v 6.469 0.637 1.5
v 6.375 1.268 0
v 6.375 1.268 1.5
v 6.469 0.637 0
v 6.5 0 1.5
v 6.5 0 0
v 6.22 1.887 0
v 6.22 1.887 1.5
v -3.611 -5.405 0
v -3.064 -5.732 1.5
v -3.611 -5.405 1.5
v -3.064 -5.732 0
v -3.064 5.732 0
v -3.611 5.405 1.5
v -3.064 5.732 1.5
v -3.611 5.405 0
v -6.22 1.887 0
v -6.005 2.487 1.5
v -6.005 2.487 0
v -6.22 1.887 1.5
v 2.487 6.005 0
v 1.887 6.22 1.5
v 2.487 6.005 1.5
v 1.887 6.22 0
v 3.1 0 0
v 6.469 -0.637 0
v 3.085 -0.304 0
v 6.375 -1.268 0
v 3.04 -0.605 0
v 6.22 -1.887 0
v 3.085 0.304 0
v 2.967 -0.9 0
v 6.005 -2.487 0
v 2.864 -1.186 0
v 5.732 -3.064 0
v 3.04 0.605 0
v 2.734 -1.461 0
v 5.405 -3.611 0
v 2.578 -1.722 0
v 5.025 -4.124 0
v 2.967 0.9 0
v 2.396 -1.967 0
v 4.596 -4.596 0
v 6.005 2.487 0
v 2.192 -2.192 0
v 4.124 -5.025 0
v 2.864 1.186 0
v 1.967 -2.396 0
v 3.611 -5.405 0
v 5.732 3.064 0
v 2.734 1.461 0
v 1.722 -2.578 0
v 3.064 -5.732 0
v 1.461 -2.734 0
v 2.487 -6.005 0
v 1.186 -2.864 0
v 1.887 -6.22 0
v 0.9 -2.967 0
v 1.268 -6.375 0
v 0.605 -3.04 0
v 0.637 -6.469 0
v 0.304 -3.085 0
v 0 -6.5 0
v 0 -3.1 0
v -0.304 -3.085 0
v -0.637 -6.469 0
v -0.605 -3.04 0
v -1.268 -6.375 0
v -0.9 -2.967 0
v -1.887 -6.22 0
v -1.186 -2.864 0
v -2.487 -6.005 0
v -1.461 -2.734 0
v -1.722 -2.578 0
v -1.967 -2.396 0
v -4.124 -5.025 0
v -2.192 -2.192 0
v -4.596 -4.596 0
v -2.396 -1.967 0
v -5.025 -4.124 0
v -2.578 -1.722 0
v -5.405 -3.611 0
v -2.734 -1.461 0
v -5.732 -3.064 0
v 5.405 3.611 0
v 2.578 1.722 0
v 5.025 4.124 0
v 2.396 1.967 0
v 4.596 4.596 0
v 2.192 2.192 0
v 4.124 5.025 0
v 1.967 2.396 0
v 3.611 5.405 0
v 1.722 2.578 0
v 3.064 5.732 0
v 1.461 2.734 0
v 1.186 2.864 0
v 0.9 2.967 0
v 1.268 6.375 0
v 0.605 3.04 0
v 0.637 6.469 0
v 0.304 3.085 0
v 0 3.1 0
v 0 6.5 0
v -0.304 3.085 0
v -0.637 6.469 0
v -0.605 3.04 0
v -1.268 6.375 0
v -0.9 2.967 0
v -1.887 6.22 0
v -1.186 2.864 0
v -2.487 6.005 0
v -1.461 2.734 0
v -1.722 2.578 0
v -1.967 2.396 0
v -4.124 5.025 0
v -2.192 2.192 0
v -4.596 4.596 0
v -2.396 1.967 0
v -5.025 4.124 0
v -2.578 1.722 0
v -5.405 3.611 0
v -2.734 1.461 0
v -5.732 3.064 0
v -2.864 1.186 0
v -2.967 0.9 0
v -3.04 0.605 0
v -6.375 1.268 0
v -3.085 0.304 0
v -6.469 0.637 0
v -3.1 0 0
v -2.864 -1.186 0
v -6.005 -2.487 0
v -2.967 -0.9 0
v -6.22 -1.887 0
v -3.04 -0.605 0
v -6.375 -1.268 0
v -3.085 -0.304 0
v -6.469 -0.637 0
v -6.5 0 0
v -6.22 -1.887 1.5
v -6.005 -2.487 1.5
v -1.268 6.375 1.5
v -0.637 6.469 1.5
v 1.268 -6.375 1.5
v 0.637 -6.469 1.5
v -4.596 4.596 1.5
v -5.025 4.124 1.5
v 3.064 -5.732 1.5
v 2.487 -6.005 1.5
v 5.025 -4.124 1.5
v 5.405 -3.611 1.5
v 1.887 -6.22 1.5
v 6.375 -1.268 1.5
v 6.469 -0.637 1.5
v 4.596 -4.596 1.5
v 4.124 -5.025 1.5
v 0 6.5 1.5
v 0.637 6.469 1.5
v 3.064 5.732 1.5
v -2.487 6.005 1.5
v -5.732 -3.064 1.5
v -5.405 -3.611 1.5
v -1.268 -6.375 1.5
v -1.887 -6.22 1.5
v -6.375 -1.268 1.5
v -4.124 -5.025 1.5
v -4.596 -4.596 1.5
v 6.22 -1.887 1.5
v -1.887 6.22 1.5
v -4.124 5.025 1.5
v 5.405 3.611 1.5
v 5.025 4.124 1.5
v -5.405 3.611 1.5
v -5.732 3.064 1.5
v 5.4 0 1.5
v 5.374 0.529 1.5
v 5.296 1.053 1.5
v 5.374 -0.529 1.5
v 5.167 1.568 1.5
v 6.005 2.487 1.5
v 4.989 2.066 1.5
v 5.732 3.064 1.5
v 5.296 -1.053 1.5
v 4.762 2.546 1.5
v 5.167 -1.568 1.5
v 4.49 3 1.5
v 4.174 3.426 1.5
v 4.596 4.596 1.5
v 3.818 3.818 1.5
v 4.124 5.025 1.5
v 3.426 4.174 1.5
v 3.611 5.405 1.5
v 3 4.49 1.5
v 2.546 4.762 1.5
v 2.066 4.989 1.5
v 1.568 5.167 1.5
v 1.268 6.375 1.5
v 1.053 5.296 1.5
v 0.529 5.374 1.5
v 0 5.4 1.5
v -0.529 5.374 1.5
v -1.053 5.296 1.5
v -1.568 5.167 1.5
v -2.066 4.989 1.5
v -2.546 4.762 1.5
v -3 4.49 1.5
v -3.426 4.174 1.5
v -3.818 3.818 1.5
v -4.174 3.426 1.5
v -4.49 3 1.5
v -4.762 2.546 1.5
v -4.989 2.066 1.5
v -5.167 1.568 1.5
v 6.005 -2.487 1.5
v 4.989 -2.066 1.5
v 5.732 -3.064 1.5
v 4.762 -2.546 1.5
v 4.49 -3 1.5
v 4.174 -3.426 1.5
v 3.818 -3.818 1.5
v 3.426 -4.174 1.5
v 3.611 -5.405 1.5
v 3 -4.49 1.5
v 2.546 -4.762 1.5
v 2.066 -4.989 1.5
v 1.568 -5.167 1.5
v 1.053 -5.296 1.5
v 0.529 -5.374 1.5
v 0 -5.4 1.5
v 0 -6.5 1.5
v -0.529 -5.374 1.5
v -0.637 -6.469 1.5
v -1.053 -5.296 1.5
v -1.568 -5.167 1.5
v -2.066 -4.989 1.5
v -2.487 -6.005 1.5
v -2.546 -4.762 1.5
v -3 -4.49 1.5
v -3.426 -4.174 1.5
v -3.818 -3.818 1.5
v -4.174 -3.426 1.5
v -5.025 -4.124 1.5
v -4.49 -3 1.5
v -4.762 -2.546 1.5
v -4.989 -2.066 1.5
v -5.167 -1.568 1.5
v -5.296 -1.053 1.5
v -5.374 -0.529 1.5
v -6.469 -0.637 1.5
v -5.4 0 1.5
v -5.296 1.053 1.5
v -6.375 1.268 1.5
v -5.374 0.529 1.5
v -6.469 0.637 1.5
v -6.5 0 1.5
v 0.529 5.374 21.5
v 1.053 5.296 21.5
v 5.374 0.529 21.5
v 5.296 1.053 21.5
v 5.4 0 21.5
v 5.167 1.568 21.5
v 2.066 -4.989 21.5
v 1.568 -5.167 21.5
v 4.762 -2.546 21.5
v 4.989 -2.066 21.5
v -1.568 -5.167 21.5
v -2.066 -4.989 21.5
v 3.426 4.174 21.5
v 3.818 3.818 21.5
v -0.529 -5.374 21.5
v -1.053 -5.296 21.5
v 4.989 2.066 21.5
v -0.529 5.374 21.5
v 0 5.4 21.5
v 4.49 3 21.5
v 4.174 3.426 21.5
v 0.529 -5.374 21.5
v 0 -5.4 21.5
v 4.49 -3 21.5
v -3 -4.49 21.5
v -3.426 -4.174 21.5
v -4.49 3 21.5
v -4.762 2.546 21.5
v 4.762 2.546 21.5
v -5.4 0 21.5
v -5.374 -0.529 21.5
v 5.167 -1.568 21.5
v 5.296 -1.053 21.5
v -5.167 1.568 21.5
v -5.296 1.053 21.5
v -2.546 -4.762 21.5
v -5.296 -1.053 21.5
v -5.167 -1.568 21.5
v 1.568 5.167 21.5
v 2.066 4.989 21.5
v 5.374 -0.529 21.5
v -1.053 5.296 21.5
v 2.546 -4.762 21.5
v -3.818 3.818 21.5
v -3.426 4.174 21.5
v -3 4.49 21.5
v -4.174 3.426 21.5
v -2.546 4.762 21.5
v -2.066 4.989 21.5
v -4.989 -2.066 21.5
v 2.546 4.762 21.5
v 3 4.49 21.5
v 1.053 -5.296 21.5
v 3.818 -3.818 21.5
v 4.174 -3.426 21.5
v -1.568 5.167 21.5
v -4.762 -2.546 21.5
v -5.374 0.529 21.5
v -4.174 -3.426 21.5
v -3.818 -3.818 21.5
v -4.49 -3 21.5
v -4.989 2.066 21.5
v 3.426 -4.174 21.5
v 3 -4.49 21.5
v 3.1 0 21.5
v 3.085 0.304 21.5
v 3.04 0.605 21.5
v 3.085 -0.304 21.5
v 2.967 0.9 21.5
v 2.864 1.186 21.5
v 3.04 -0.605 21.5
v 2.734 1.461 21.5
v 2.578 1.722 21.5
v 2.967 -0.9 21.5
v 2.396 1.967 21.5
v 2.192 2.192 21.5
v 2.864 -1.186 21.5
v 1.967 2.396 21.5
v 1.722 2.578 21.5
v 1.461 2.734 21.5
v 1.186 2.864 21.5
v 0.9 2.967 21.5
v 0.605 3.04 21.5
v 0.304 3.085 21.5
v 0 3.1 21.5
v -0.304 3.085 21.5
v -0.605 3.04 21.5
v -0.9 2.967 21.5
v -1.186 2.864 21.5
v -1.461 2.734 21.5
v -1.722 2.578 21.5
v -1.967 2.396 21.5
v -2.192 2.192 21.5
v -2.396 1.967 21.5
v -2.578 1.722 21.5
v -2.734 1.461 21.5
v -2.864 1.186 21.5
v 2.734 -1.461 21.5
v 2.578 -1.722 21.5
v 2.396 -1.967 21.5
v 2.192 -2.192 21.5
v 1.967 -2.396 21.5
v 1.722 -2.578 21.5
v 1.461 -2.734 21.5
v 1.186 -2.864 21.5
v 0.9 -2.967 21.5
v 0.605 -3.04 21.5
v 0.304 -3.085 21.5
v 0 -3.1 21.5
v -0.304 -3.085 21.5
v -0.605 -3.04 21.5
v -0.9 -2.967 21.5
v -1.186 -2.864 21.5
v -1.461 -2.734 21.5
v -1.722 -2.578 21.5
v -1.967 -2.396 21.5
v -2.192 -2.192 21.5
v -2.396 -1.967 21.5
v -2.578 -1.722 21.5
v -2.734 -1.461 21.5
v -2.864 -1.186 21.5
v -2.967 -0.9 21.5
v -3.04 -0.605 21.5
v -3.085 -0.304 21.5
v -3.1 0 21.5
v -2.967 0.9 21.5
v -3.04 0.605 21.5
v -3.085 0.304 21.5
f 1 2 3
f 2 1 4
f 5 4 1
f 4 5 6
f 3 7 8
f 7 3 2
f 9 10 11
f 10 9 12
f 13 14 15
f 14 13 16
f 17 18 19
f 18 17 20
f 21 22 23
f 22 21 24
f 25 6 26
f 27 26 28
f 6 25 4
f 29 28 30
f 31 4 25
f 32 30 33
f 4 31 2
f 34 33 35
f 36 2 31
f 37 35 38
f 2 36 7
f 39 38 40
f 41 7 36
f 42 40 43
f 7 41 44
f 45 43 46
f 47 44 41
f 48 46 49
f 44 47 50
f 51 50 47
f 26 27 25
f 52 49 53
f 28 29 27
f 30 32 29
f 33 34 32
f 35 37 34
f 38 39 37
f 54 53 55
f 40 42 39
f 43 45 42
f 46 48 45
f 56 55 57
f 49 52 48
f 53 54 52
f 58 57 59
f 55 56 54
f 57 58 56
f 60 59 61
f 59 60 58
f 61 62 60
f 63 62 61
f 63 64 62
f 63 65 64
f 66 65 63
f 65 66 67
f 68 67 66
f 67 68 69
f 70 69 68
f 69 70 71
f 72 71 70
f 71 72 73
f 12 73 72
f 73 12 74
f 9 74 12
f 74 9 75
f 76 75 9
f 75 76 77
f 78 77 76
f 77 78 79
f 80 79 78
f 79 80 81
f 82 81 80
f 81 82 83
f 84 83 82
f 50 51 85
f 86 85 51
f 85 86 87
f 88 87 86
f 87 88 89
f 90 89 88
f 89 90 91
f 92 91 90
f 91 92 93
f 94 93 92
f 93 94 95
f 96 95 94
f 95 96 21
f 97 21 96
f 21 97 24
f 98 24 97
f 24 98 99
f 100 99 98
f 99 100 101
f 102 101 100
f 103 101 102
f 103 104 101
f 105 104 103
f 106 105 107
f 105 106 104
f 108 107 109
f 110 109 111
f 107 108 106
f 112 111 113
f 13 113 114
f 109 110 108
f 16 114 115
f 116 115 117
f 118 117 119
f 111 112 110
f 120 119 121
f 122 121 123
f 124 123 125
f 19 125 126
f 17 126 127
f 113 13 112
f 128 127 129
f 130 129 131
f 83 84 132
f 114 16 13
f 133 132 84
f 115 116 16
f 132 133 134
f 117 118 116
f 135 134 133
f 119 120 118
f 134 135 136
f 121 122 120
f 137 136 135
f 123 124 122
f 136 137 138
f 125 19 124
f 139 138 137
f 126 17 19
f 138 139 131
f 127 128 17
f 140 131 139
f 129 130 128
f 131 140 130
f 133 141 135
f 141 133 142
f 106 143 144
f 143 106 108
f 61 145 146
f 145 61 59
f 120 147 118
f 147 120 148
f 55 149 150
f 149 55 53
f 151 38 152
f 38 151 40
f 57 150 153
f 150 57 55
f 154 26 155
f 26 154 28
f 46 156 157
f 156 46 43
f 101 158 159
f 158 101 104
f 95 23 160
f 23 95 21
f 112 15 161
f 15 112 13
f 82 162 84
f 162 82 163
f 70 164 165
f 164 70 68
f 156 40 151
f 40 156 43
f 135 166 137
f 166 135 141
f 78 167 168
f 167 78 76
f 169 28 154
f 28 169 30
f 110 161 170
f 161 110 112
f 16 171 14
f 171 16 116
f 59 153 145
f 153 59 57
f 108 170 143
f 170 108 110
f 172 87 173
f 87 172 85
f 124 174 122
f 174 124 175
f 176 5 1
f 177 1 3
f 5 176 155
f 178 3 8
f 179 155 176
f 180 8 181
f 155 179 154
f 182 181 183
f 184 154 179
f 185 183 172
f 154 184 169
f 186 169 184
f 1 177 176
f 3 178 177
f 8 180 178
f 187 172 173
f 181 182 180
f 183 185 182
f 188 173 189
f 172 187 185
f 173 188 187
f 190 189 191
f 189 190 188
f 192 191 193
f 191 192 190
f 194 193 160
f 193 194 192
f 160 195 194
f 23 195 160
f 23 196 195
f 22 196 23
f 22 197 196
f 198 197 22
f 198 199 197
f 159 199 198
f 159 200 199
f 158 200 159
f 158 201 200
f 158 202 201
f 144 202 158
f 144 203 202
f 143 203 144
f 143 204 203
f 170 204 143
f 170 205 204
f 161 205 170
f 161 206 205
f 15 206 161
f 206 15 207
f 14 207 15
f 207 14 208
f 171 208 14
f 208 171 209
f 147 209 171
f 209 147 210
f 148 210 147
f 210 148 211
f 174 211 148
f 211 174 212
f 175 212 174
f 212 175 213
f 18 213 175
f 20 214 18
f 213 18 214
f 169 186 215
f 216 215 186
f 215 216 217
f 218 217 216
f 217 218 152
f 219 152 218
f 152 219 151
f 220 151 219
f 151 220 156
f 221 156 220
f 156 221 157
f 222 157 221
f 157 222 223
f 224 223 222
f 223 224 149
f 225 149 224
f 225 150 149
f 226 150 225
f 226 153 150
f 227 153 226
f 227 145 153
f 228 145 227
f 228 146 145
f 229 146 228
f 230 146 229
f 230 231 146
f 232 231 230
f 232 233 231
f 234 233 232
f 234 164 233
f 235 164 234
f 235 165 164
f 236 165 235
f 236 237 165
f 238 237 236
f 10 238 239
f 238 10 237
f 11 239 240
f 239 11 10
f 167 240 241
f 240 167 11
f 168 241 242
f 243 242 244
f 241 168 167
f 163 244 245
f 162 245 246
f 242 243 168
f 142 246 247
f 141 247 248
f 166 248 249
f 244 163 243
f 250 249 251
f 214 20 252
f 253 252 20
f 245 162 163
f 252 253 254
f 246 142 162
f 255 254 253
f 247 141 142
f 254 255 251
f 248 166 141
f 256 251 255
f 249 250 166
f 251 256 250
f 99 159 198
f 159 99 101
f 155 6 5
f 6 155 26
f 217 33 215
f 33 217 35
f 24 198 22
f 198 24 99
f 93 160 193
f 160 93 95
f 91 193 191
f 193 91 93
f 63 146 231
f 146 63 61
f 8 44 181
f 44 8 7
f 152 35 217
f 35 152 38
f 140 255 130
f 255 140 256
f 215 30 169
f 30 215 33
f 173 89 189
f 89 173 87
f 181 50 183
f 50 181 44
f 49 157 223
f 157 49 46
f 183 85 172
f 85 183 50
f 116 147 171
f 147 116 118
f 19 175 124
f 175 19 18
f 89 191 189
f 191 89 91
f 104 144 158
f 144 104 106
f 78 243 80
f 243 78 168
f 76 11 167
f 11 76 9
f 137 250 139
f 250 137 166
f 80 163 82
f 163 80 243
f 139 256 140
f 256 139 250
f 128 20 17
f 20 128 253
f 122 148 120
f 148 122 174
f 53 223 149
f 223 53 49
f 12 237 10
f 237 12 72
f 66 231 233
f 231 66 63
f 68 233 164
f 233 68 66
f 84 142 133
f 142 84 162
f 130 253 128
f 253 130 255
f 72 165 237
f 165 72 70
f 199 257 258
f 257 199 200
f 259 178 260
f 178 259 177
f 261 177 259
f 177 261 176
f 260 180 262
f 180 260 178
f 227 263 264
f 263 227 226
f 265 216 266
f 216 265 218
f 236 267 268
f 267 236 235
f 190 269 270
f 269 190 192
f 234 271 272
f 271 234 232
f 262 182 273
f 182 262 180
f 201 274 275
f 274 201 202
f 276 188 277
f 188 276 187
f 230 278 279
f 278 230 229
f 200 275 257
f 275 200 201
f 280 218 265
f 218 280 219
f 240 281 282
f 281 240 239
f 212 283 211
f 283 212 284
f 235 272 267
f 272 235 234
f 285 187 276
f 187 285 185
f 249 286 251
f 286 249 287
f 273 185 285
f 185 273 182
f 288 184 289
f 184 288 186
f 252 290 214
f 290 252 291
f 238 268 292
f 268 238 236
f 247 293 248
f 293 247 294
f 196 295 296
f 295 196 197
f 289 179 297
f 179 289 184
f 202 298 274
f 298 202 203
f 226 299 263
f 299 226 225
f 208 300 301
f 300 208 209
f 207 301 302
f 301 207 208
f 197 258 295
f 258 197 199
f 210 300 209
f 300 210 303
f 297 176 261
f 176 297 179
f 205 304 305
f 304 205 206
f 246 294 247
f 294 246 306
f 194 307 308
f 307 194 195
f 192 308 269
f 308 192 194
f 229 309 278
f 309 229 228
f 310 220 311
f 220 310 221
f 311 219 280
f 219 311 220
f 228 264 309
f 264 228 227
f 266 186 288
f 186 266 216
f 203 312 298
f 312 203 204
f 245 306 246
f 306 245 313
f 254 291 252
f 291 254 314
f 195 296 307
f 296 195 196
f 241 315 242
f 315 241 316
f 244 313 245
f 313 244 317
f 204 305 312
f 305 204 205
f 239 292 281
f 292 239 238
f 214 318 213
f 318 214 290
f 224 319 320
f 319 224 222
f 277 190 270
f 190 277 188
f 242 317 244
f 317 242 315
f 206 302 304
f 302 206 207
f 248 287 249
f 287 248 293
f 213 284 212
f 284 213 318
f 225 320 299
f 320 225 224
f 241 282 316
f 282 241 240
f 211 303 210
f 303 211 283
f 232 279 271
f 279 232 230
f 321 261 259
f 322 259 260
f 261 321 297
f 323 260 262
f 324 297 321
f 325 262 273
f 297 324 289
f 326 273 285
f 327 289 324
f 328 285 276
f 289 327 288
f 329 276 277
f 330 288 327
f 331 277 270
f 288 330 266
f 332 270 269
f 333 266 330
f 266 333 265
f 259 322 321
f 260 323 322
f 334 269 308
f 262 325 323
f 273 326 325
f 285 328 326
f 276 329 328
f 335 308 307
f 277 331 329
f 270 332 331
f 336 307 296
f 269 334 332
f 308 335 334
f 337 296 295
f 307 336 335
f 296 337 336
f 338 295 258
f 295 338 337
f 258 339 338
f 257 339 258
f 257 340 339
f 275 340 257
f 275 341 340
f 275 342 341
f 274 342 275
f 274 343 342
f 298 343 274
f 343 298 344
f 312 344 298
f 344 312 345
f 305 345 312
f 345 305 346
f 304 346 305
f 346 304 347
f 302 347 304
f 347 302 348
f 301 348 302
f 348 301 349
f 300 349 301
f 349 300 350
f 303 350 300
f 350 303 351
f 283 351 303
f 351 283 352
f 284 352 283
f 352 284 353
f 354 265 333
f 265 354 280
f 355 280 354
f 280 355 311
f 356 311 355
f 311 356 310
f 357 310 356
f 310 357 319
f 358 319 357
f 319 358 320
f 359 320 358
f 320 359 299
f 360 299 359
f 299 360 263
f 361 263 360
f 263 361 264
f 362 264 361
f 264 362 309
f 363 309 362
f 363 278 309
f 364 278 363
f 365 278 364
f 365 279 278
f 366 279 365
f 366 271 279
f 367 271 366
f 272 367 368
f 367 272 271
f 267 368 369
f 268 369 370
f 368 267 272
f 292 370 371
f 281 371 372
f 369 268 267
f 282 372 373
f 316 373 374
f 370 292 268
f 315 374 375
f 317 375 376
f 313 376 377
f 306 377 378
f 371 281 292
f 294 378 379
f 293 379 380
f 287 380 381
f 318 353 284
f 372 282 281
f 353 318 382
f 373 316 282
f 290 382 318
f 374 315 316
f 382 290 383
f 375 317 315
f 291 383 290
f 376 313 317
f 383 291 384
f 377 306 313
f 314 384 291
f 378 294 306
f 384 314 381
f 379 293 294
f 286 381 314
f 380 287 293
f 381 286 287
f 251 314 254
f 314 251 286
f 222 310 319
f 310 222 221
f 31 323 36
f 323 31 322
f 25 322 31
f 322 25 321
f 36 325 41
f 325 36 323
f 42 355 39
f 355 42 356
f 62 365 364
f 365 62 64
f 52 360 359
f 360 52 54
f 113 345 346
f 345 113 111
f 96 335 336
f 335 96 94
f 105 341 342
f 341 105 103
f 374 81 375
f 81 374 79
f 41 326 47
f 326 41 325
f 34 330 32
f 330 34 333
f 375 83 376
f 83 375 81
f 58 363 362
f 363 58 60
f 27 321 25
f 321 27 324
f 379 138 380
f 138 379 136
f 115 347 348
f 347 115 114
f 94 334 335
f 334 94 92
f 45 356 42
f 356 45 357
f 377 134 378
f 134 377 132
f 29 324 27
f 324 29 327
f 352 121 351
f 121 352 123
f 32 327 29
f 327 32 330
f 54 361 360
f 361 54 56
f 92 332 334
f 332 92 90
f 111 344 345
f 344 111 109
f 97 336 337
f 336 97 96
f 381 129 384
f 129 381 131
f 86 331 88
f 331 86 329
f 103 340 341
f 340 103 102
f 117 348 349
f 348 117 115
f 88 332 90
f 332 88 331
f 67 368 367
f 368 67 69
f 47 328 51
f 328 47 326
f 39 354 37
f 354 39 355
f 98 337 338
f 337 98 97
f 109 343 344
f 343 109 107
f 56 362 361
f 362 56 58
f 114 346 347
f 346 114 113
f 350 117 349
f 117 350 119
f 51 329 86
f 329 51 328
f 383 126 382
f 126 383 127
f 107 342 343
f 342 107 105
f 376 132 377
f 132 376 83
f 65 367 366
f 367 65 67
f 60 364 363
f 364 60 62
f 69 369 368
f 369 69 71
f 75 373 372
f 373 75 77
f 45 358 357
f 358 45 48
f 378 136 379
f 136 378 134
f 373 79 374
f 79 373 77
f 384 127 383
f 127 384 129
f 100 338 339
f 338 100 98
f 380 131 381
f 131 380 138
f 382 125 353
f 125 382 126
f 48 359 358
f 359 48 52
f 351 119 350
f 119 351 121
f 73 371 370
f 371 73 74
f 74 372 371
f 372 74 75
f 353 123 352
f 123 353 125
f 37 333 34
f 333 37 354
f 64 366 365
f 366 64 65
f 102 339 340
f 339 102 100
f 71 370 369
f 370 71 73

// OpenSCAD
// Adapter sleeve: 0.2 mL PCR tube in a 1.5 mL tube rack hole
// Print orientation: collar on the bed (z = 0), sleeve body upward.

$fn = 64;

// ---- Dimensions (mm) ----
collar_d      = 13;    // collar outer diameter
collar_h      = 1.5;   // collar thickness (z = 0 to 1.5)
sleeve_od     = 10.8;  // sleeve body outer diameter
sleeve_top_z  = 21.5;  // top of sleeve body (z)
bore_d        = 6.2;   // through-bore diameter
eps           = 0.5;   // cutter overshoot past faces

// ---- Model ----
difference() {
    union() {
        // Collar
        cylinder(d = collar_d, h = collar_h);
        // Sleeve body (slightly overlaps collar for a clean union)
        translate([0, 0, collar_h - 0.01])
            cylinder(d = sleeve_od, h = sleeve_top_z - collar_h + 0.01);
    }
    // Full-height through-bore
    translate([0, 0, -eps])
        cylinder(d = bore_d, h = sleeve_top_z + 2 * eps);
}
